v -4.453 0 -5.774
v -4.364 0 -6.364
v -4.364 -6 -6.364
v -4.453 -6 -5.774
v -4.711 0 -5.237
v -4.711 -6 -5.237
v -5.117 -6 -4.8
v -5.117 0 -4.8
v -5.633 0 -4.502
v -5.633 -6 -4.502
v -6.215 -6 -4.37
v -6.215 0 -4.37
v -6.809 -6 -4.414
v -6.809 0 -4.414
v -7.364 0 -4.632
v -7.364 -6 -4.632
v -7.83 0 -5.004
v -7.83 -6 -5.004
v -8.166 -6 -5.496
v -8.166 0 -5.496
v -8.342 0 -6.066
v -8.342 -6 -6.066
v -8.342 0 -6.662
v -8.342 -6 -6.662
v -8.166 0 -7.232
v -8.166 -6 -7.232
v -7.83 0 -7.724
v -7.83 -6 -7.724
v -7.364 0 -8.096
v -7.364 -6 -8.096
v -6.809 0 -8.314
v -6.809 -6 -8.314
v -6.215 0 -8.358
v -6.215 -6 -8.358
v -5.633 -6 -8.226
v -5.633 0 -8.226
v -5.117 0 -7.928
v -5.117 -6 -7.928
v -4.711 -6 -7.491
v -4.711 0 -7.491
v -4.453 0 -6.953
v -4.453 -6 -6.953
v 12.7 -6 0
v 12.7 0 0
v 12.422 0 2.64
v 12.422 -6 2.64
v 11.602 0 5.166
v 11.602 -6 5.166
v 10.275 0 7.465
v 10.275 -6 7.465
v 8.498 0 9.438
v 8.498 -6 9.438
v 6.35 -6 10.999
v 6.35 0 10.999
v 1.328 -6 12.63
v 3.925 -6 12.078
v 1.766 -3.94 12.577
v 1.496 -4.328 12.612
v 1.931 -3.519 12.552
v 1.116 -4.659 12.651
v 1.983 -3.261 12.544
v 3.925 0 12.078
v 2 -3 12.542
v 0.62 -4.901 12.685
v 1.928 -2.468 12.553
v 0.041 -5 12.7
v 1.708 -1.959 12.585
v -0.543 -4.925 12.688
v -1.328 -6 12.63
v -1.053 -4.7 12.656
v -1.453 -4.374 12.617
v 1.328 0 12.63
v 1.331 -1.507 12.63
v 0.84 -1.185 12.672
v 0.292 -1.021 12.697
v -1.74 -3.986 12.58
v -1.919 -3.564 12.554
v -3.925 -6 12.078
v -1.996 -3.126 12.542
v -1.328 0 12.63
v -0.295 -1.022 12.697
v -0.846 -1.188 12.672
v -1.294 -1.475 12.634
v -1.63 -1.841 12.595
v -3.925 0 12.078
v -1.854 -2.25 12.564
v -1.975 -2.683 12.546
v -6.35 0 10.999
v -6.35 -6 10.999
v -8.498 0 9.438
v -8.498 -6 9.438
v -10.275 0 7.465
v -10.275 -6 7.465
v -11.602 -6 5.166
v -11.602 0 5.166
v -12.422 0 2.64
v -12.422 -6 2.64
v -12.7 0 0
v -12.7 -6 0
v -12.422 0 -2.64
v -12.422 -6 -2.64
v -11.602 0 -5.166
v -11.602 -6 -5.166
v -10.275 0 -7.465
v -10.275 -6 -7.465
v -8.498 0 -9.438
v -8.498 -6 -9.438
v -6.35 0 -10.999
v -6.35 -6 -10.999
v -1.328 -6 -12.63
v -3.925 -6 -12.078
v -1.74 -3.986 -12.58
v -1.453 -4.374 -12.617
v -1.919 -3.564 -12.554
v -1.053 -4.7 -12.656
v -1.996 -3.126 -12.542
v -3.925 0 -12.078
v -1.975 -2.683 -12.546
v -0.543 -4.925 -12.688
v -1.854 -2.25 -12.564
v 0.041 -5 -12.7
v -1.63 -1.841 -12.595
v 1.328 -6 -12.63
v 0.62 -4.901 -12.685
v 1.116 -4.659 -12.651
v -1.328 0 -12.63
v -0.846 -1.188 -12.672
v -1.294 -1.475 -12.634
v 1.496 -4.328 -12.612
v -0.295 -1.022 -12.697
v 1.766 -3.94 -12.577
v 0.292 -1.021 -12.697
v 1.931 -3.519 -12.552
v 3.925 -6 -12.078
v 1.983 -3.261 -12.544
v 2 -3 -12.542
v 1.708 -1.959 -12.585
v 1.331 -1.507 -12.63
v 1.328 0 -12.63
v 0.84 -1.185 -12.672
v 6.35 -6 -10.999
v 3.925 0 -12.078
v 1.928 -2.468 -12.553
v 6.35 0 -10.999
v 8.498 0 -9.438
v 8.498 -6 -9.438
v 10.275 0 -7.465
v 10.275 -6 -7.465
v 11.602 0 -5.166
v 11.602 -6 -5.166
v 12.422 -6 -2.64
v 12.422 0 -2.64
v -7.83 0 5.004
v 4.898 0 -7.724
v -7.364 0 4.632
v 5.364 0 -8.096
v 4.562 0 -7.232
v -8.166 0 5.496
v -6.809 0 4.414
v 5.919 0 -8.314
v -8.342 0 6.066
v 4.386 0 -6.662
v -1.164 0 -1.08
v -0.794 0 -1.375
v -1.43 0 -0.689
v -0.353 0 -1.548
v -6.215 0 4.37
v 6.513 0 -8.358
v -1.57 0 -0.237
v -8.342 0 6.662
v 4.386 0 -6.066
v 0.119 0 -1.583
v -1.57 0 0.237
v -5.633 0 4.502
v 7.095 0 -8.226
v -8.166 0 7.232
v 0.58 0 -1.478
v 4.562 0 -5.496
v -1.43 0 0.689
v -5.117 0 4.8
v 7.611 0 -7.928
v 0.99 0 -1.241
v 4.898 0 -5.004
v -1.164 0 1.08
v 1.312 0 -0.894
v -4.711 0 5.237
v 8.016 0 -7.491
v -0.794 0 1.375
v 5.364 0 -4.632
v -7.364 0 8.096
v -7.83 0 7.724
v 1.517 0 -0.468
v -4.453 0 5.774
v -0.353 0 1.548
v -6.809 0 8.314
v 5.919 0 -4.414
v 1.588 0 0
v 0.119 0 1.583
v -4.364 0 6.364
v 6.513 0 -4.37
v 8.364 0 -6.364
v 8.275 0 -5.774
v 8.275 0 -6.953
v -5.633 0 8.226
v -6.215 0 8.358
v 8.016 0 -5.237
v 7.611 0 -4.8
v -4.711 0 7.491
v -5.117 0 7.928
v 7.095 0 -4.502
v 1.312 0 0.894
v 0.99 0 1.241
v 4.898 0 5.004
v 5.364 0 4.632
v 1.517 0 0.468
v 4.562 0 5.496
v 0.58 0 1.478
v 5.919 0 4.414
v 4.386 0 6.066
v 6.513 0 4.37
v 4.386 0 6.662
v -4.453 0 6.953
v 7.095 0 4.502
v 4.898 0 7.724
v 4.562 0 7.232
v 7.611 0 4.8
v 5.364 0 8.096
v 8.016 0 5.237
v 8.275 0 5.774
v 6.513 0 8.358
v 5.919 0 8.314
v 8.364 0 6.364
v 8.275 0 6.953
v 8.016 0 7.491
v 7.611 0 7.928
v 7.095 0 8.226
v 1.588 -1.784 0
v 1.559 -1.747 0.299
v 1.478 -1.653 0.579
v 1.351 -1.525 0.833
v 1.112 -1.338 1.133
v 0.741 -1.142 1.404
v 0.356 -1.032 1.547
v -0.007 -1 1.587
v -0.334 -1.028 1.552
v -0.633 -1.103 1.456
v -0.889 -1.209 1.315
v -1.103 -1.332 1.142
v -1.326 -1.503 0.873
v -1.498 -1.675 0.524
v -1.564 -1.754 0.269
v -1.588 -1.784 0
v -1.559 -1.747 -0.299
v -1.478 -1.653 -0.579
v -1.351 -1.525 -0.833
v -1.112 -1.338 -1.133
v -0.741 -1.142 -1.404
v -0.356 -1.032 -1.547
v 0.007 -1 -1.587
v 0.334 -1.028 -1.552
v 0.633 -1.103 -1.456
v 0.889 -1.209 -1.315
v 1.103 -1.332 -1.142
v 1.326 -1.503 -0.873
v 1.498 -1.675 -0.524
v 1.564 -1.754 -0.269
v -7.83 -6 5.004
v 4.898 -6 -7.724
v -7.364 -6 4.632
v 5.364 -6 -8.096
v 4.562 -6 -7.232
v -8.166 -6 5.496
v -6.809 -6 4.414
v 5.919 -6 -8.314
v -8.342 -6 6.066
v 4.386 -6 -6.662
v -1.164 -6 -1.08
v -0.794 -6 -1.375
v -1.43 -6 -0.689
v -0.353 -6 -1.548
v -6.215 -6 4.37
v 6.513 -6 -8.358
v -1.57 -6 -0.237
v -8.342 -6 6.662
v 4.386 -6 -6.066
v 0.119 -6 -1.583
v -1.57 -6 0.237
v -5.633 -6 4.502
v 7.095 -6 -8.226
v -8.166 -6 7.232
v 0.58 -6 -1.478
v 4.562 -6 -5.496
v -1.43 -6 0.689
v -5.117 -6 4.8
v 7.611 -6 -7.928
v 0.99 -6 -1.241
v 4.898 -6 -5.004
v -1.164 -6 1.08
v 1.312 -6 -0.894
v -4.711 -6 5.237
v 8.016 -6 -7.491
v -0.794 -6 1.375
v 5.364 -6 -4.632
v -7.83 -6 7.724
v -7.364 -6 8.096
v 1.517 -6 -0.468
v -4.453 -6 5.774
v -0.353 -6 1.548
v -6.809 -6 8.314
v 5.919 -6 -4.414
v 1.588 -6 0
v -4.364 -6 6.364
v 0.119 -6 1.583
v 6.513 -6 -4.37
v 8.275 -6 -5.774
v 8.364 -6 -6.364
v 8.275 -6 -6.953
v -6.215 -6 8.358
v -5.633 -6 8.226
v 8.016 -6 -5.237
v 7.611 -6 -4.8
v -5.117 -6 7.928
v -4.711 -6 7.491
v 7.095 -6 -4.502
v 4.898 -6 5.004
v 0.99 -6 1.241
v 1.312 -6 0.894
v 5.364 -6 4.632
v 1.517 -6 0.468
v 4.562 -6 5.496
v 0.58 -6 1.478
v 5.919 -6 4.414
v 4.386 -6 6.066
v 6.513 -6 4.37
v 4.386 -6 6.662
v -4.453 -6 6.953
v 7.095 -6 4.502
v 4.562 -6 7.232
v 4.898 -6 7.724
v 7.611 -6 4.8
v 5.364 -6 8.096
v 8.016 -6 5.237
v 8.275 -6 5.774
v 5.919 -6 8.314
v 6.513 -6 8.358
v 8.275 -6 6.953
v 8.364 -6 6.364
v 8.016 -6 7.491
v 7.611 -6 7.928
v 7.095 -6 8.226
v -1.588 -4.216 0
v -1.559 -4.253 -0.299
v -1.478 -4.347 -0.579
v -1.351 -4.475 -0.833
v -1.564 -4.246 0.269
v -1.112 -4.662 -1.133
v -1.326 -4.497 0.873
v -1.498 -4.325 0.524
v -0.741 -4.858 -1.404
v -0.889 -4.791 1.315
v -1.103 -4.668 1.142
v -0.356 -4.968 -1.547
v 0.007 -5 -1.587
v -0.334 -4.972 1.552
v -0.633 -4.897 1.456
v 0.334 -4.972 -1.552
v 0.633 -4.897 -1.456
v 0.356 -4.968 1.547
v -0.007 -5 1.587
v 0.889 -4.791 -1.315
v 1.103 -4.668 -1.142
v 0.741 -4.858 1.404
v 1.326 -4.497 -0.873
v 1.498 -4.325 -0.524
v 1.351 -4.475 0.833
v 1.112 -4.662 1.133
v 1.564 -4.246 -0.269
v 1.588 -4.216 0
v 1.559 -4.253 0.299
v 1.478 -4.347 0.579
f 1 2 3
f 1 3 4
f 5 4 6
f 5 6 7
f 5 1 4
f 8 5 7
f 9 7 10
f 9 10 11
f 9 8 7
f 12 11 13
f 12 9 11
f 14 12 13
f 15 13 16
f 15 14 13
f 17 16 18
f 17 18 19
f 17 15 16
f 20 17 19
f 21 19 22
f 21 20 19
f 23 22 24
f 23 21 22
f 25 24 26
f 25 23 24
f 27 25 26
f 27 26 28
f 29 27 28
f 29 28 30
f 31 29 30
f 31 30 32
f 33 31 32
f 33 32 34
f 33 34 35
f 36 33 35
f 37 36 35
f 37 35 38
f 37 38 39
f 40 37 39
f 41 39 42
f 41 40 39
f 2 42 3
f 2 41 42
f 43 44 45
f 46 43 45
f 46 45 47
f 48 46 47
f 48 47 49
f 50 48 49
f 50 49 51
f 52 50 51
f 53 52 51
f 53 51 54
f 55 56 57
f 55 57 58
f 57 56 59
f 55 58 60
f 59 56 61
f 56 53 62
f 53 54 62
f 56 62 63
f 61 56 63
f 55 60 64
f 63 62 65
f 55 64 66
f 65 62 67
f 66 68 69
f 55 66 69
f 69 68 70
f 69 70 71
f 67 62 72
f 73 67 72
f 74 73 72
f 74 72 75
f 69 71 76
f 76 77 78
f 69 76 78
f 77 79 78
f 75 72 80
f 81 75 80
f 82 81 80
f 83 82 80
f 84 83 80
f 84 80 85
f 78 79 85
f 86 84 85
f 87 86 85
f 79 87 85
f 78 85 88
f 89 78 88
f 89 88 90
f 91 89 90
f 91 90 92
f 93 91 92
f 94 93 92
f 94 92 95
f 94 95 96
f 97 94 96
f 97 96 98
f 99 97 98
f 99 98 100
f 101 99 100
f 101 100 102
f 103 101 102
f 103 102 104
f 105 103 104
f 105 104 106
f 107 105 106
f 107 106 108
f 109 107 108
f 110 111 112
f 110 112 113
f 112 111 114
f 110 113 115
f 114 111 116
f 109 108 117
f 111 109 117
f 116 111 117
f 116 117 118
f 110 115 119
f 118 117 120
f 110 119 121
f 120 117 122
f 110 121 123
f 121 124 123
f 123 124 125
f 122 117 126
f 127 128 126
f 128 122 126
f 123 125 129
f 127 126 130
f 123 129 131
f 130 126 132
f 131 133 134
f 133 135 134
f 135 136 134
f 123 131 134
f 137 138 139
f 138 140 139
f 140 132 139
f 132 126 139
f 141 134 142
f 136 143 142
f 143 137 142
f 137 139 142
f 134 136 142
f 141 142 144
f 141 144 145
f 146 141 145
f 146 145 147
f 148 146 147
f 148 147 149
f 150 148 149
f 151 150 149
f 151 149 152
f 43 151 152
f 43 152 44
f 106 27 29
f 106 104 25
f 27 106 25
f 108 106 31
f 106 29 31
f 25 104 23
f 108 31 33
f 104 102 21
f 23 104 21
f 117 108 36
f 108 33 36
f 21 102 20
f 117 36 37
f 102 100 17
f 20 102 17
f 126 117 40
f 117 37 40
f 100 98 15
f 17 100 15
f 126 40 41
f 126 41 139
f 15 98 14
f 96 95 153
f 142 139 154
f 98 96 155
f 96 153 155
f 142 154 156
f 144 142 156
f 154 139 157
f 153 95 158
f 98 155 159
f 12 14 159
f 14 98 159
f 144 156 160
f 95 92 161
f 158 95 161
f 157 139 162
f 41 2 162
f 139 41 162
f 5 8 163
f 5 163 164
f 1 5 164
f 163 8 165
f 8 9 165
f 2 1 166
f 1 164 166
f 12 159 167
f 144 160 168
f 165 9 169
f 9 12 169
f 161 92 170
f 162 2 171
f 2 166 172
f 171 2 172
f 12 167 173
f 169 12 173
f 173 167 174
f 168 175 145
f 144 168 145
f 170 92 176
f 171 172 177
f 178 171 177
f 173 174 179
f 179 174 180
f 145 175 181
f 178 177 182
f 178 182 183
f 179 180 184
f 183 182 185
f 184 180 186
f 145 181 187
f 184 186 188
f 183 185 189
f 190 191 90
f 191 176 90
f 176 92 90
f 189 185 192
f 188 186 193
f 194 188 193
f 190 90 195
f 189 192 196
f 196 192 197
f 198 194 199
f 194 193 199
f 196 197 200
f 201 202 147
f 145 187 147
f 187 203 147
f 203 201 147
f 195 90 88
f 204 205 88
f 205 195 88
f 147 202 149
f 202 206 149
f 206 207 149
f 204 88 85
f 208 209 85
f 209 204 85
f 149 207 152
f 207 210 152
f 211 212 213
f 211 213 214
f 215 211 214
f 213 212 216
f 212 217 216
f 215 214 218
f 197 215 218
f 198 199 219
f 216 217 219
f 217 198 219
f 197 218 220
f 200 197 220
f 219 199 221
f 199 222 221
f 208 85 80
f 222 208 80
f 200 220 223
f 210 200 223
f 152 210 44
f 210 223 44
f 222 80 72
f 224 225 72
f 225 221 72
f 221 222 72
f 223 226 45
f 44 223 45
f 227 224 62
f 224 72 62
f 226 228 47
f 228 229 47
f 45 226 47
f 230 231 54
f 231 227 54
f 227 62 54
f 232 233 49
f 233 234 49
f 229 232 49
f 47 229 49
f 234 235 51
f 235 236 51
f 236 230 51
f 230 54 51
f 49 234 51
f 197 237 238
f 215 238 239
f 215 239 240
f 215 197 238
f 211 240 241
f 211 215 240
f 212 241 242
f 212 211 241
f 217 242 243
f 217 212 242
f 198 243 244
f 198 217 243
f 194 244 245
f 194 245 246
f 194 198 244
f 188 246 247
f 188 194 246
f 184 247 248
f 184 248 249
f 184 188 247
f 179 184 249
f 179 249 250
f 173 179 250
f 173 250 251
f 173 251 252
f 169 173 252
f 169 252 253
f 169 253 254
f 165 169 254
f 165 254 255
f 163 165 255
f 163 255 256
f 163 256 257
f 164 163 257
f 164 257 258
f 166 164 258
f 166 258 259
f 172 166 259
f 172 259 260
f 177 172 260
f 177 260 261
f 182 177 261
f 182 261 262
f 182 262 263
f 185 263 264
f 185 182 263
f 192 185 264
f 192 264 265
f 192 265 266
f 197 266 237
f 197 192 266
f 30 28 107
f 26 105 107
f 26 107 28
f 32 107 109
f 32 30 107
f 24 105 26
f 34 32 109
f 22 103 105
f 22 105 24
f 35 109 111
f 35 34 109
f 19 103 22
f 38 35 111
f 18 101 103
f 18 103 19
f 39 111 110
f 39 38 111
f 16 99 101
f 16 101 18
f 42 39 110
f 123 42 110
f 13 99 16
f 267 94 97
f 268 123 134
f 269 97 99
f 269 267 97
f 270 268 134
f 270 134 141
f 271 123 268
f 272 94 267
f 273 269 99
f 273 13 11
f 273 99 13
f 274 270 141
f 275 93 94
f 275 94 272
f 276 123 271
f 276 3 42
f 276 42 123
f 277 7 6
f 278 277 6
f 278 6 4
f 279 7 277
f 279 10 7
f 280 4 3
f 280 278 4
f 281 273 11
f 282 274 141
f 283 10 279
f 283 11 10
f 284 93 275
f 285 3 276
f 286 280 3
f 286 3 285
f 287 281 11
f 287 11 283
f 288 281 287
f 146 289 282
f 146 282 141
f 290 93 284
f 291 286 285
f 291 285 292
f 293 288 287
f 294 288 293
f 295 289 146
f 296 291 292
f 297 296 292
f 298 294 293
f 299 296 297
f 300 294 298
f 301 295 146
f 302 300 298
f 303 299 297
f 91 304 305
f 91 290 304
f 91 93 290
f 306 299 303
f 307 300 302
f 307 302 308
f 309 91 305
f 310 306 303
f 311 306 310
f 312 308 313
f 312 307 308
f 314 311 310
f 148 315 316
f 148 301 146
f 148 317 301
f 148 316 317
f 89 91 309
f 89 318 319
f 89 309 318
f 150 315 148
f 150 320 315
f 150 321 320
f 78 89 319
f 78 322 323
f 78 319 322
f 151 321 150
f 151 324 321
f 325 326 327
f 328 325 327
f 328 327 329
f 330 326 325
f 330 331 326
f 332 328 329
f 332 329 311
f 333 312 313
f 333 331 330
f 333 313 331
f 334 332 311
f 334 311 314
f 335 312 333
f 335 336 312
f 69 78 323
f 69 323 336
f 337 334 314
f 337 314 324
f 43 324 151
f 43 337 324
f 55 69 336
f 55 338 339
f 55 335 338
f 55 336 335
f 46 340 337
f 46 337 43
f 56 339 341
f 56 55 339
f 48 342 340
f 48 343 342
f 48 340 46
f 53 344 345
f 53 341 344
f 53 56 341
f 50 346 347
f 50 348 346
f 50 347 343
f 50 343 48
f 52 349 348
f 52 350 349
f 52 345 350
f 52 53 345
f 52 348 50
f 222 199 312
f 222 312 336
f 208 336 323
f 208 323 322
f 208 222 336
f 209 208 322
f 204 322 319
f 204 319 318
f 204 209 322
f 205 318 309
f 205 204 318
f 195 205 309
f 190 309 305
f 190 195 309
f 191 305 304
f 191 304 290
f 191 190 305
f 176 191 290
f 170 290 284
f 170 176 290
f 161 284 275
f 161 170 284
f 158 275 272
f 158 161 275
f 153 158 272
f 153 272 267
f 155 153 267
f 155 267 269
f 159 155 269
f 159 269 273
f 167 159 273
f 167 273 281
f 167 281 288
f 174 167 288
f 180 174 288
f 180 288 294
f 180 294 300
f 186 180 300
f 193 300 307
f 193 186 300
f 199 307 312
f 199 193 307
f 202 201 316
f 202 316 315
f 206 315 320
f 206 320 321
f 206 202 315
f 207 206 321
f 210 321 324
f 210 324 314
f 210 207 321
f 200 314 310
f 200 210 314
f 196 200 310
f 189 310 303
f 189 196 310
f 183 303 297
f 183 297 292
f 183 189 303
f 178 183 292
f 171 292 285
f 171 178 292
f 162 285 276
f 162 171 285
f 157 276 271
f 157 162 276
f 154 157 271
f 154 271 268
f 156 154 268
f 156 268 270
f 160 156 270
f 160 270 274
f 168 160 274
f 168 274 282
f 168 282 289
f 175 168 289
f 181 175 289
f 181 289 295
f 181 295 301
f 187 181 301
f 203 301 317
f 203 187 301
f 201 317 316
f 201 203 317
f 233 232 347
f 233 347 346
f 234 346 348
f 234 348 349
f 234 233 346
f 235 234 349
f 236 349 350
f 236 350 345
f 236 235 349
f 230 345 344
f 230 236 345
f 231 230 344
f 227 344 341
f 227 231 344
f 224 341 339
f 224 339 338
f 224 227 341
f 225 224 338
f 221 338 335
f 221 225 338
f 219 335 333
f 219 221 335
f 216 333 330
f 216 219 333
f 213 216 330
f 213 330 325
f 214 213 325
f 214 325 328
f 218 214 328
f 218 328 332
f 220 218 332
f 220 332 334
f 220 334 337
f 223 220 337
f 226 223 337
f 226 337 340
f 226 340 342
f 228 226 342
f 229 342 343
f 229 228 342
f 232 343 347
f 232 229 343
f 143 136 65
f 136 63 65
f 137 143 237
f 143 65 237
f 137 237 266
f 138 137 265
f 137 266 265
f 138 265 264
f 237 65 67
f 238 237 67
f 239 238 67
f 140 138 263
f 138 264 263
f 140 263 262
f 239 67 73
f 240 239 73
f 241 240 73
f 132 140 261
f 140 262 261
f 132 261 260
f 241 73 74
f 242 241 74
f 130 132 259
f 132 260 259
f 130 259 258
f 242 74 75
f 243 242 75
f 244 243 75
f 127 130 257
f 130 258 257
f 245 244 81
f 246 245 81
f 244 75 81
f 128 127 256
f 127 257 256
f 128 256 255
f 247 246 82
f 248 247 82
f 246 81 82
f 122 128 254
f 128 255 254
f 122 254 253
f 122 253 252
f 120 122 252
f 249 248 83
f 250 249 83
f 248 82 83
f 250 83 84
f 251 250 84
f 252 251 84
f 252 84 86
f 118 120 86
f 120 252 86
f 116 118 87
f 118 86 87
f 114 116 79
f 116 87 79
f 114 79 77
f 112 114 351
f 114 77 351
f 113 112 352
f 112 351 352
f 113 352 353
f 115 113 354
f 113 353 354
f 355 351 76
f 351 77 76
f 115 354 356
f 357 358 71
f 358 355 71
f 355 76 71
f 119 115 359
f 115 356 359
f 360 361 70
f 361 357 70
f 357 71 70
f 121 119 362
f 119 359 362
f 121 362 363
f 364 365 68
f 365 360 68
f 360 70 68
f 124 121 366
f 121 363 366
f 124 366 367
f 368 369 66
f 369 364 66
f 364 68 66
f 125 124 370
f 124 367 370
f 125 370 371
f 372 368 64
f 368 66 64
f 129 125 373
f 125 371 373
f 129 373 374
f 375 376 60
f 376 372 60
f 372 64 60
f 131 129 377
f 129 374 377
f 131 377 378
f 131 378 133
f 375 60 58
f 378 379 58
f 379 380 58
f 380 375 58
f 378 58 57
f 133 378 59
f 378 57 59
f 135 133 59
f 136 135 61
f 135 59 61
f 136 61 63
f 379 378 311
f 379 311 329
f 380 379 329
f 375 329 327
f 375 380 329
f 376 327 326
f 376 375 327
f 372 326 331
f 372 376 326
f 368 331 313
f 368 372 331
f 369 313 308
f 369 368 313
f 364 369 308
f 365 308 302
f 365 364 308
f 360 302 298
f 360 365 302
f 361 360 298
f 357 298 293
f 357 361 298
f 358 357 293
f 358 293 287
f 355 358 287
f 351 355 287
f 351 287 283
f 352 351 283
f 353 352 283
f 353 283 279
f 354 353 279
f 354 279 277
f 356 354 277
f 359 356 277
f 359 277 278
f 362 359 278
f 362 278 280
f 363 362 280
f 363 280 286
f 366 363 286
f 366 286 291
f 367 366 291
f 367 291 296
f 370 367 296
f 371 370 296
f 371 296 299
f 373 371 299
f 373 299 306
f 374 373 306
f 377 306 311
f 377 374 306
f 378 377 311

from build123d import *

# Parameters (mm, degrees)
F0_R          = 12.7
F0_R_2        = 2
F0_R_3        = 1.5875
F1_DEPTH      = 6
F2_R          = 2
F3_DEPTH      = 12.701
F3_DEPTH_BACK = 12.701


with BuildPart() as f1:
    # F0 (on Front) → F1 (new body)
    with BuildSketch(Plane.XZ):
        Circle(F0_R)
        with Locations((-6.3639610307, -6.3639610307)):
            Circle(F0_R_2, mode=Mode.SUBTRACT)
        Circle(F0_R_3, mode=Mode.SUBTRACT)
        with Locations((6.3639610307, -6.3639610307)):
            Circle(F0_R_2, mode=Mode.SUBTRACT)
        with Locations((-6.3639610307, 6.3639610307)):
            Circle(F0_R_2, mode=Mode.SUBTRACT)
        with Locations((6.3639610307, 6.3639610307)):
            Circle(F0_R_2, mode=Mode.SUBTRACT)
    extrude(amount=F1_DEPTH)

    # F2 (on Top) → F3 (cut, two sides)
    with BuildSketch(Plane.XY) as f3_sk:
        with Locations((0, -3)):
            Circle(F2_R)
    extrude(amount=-F3_DEPTH, mode=Mode.SUBTRACT)
    extrude(f3_sk.sketch, amount=F3_DEPTH_BACK, mode=Mode.SUBTRACT)


solid = f1.part
